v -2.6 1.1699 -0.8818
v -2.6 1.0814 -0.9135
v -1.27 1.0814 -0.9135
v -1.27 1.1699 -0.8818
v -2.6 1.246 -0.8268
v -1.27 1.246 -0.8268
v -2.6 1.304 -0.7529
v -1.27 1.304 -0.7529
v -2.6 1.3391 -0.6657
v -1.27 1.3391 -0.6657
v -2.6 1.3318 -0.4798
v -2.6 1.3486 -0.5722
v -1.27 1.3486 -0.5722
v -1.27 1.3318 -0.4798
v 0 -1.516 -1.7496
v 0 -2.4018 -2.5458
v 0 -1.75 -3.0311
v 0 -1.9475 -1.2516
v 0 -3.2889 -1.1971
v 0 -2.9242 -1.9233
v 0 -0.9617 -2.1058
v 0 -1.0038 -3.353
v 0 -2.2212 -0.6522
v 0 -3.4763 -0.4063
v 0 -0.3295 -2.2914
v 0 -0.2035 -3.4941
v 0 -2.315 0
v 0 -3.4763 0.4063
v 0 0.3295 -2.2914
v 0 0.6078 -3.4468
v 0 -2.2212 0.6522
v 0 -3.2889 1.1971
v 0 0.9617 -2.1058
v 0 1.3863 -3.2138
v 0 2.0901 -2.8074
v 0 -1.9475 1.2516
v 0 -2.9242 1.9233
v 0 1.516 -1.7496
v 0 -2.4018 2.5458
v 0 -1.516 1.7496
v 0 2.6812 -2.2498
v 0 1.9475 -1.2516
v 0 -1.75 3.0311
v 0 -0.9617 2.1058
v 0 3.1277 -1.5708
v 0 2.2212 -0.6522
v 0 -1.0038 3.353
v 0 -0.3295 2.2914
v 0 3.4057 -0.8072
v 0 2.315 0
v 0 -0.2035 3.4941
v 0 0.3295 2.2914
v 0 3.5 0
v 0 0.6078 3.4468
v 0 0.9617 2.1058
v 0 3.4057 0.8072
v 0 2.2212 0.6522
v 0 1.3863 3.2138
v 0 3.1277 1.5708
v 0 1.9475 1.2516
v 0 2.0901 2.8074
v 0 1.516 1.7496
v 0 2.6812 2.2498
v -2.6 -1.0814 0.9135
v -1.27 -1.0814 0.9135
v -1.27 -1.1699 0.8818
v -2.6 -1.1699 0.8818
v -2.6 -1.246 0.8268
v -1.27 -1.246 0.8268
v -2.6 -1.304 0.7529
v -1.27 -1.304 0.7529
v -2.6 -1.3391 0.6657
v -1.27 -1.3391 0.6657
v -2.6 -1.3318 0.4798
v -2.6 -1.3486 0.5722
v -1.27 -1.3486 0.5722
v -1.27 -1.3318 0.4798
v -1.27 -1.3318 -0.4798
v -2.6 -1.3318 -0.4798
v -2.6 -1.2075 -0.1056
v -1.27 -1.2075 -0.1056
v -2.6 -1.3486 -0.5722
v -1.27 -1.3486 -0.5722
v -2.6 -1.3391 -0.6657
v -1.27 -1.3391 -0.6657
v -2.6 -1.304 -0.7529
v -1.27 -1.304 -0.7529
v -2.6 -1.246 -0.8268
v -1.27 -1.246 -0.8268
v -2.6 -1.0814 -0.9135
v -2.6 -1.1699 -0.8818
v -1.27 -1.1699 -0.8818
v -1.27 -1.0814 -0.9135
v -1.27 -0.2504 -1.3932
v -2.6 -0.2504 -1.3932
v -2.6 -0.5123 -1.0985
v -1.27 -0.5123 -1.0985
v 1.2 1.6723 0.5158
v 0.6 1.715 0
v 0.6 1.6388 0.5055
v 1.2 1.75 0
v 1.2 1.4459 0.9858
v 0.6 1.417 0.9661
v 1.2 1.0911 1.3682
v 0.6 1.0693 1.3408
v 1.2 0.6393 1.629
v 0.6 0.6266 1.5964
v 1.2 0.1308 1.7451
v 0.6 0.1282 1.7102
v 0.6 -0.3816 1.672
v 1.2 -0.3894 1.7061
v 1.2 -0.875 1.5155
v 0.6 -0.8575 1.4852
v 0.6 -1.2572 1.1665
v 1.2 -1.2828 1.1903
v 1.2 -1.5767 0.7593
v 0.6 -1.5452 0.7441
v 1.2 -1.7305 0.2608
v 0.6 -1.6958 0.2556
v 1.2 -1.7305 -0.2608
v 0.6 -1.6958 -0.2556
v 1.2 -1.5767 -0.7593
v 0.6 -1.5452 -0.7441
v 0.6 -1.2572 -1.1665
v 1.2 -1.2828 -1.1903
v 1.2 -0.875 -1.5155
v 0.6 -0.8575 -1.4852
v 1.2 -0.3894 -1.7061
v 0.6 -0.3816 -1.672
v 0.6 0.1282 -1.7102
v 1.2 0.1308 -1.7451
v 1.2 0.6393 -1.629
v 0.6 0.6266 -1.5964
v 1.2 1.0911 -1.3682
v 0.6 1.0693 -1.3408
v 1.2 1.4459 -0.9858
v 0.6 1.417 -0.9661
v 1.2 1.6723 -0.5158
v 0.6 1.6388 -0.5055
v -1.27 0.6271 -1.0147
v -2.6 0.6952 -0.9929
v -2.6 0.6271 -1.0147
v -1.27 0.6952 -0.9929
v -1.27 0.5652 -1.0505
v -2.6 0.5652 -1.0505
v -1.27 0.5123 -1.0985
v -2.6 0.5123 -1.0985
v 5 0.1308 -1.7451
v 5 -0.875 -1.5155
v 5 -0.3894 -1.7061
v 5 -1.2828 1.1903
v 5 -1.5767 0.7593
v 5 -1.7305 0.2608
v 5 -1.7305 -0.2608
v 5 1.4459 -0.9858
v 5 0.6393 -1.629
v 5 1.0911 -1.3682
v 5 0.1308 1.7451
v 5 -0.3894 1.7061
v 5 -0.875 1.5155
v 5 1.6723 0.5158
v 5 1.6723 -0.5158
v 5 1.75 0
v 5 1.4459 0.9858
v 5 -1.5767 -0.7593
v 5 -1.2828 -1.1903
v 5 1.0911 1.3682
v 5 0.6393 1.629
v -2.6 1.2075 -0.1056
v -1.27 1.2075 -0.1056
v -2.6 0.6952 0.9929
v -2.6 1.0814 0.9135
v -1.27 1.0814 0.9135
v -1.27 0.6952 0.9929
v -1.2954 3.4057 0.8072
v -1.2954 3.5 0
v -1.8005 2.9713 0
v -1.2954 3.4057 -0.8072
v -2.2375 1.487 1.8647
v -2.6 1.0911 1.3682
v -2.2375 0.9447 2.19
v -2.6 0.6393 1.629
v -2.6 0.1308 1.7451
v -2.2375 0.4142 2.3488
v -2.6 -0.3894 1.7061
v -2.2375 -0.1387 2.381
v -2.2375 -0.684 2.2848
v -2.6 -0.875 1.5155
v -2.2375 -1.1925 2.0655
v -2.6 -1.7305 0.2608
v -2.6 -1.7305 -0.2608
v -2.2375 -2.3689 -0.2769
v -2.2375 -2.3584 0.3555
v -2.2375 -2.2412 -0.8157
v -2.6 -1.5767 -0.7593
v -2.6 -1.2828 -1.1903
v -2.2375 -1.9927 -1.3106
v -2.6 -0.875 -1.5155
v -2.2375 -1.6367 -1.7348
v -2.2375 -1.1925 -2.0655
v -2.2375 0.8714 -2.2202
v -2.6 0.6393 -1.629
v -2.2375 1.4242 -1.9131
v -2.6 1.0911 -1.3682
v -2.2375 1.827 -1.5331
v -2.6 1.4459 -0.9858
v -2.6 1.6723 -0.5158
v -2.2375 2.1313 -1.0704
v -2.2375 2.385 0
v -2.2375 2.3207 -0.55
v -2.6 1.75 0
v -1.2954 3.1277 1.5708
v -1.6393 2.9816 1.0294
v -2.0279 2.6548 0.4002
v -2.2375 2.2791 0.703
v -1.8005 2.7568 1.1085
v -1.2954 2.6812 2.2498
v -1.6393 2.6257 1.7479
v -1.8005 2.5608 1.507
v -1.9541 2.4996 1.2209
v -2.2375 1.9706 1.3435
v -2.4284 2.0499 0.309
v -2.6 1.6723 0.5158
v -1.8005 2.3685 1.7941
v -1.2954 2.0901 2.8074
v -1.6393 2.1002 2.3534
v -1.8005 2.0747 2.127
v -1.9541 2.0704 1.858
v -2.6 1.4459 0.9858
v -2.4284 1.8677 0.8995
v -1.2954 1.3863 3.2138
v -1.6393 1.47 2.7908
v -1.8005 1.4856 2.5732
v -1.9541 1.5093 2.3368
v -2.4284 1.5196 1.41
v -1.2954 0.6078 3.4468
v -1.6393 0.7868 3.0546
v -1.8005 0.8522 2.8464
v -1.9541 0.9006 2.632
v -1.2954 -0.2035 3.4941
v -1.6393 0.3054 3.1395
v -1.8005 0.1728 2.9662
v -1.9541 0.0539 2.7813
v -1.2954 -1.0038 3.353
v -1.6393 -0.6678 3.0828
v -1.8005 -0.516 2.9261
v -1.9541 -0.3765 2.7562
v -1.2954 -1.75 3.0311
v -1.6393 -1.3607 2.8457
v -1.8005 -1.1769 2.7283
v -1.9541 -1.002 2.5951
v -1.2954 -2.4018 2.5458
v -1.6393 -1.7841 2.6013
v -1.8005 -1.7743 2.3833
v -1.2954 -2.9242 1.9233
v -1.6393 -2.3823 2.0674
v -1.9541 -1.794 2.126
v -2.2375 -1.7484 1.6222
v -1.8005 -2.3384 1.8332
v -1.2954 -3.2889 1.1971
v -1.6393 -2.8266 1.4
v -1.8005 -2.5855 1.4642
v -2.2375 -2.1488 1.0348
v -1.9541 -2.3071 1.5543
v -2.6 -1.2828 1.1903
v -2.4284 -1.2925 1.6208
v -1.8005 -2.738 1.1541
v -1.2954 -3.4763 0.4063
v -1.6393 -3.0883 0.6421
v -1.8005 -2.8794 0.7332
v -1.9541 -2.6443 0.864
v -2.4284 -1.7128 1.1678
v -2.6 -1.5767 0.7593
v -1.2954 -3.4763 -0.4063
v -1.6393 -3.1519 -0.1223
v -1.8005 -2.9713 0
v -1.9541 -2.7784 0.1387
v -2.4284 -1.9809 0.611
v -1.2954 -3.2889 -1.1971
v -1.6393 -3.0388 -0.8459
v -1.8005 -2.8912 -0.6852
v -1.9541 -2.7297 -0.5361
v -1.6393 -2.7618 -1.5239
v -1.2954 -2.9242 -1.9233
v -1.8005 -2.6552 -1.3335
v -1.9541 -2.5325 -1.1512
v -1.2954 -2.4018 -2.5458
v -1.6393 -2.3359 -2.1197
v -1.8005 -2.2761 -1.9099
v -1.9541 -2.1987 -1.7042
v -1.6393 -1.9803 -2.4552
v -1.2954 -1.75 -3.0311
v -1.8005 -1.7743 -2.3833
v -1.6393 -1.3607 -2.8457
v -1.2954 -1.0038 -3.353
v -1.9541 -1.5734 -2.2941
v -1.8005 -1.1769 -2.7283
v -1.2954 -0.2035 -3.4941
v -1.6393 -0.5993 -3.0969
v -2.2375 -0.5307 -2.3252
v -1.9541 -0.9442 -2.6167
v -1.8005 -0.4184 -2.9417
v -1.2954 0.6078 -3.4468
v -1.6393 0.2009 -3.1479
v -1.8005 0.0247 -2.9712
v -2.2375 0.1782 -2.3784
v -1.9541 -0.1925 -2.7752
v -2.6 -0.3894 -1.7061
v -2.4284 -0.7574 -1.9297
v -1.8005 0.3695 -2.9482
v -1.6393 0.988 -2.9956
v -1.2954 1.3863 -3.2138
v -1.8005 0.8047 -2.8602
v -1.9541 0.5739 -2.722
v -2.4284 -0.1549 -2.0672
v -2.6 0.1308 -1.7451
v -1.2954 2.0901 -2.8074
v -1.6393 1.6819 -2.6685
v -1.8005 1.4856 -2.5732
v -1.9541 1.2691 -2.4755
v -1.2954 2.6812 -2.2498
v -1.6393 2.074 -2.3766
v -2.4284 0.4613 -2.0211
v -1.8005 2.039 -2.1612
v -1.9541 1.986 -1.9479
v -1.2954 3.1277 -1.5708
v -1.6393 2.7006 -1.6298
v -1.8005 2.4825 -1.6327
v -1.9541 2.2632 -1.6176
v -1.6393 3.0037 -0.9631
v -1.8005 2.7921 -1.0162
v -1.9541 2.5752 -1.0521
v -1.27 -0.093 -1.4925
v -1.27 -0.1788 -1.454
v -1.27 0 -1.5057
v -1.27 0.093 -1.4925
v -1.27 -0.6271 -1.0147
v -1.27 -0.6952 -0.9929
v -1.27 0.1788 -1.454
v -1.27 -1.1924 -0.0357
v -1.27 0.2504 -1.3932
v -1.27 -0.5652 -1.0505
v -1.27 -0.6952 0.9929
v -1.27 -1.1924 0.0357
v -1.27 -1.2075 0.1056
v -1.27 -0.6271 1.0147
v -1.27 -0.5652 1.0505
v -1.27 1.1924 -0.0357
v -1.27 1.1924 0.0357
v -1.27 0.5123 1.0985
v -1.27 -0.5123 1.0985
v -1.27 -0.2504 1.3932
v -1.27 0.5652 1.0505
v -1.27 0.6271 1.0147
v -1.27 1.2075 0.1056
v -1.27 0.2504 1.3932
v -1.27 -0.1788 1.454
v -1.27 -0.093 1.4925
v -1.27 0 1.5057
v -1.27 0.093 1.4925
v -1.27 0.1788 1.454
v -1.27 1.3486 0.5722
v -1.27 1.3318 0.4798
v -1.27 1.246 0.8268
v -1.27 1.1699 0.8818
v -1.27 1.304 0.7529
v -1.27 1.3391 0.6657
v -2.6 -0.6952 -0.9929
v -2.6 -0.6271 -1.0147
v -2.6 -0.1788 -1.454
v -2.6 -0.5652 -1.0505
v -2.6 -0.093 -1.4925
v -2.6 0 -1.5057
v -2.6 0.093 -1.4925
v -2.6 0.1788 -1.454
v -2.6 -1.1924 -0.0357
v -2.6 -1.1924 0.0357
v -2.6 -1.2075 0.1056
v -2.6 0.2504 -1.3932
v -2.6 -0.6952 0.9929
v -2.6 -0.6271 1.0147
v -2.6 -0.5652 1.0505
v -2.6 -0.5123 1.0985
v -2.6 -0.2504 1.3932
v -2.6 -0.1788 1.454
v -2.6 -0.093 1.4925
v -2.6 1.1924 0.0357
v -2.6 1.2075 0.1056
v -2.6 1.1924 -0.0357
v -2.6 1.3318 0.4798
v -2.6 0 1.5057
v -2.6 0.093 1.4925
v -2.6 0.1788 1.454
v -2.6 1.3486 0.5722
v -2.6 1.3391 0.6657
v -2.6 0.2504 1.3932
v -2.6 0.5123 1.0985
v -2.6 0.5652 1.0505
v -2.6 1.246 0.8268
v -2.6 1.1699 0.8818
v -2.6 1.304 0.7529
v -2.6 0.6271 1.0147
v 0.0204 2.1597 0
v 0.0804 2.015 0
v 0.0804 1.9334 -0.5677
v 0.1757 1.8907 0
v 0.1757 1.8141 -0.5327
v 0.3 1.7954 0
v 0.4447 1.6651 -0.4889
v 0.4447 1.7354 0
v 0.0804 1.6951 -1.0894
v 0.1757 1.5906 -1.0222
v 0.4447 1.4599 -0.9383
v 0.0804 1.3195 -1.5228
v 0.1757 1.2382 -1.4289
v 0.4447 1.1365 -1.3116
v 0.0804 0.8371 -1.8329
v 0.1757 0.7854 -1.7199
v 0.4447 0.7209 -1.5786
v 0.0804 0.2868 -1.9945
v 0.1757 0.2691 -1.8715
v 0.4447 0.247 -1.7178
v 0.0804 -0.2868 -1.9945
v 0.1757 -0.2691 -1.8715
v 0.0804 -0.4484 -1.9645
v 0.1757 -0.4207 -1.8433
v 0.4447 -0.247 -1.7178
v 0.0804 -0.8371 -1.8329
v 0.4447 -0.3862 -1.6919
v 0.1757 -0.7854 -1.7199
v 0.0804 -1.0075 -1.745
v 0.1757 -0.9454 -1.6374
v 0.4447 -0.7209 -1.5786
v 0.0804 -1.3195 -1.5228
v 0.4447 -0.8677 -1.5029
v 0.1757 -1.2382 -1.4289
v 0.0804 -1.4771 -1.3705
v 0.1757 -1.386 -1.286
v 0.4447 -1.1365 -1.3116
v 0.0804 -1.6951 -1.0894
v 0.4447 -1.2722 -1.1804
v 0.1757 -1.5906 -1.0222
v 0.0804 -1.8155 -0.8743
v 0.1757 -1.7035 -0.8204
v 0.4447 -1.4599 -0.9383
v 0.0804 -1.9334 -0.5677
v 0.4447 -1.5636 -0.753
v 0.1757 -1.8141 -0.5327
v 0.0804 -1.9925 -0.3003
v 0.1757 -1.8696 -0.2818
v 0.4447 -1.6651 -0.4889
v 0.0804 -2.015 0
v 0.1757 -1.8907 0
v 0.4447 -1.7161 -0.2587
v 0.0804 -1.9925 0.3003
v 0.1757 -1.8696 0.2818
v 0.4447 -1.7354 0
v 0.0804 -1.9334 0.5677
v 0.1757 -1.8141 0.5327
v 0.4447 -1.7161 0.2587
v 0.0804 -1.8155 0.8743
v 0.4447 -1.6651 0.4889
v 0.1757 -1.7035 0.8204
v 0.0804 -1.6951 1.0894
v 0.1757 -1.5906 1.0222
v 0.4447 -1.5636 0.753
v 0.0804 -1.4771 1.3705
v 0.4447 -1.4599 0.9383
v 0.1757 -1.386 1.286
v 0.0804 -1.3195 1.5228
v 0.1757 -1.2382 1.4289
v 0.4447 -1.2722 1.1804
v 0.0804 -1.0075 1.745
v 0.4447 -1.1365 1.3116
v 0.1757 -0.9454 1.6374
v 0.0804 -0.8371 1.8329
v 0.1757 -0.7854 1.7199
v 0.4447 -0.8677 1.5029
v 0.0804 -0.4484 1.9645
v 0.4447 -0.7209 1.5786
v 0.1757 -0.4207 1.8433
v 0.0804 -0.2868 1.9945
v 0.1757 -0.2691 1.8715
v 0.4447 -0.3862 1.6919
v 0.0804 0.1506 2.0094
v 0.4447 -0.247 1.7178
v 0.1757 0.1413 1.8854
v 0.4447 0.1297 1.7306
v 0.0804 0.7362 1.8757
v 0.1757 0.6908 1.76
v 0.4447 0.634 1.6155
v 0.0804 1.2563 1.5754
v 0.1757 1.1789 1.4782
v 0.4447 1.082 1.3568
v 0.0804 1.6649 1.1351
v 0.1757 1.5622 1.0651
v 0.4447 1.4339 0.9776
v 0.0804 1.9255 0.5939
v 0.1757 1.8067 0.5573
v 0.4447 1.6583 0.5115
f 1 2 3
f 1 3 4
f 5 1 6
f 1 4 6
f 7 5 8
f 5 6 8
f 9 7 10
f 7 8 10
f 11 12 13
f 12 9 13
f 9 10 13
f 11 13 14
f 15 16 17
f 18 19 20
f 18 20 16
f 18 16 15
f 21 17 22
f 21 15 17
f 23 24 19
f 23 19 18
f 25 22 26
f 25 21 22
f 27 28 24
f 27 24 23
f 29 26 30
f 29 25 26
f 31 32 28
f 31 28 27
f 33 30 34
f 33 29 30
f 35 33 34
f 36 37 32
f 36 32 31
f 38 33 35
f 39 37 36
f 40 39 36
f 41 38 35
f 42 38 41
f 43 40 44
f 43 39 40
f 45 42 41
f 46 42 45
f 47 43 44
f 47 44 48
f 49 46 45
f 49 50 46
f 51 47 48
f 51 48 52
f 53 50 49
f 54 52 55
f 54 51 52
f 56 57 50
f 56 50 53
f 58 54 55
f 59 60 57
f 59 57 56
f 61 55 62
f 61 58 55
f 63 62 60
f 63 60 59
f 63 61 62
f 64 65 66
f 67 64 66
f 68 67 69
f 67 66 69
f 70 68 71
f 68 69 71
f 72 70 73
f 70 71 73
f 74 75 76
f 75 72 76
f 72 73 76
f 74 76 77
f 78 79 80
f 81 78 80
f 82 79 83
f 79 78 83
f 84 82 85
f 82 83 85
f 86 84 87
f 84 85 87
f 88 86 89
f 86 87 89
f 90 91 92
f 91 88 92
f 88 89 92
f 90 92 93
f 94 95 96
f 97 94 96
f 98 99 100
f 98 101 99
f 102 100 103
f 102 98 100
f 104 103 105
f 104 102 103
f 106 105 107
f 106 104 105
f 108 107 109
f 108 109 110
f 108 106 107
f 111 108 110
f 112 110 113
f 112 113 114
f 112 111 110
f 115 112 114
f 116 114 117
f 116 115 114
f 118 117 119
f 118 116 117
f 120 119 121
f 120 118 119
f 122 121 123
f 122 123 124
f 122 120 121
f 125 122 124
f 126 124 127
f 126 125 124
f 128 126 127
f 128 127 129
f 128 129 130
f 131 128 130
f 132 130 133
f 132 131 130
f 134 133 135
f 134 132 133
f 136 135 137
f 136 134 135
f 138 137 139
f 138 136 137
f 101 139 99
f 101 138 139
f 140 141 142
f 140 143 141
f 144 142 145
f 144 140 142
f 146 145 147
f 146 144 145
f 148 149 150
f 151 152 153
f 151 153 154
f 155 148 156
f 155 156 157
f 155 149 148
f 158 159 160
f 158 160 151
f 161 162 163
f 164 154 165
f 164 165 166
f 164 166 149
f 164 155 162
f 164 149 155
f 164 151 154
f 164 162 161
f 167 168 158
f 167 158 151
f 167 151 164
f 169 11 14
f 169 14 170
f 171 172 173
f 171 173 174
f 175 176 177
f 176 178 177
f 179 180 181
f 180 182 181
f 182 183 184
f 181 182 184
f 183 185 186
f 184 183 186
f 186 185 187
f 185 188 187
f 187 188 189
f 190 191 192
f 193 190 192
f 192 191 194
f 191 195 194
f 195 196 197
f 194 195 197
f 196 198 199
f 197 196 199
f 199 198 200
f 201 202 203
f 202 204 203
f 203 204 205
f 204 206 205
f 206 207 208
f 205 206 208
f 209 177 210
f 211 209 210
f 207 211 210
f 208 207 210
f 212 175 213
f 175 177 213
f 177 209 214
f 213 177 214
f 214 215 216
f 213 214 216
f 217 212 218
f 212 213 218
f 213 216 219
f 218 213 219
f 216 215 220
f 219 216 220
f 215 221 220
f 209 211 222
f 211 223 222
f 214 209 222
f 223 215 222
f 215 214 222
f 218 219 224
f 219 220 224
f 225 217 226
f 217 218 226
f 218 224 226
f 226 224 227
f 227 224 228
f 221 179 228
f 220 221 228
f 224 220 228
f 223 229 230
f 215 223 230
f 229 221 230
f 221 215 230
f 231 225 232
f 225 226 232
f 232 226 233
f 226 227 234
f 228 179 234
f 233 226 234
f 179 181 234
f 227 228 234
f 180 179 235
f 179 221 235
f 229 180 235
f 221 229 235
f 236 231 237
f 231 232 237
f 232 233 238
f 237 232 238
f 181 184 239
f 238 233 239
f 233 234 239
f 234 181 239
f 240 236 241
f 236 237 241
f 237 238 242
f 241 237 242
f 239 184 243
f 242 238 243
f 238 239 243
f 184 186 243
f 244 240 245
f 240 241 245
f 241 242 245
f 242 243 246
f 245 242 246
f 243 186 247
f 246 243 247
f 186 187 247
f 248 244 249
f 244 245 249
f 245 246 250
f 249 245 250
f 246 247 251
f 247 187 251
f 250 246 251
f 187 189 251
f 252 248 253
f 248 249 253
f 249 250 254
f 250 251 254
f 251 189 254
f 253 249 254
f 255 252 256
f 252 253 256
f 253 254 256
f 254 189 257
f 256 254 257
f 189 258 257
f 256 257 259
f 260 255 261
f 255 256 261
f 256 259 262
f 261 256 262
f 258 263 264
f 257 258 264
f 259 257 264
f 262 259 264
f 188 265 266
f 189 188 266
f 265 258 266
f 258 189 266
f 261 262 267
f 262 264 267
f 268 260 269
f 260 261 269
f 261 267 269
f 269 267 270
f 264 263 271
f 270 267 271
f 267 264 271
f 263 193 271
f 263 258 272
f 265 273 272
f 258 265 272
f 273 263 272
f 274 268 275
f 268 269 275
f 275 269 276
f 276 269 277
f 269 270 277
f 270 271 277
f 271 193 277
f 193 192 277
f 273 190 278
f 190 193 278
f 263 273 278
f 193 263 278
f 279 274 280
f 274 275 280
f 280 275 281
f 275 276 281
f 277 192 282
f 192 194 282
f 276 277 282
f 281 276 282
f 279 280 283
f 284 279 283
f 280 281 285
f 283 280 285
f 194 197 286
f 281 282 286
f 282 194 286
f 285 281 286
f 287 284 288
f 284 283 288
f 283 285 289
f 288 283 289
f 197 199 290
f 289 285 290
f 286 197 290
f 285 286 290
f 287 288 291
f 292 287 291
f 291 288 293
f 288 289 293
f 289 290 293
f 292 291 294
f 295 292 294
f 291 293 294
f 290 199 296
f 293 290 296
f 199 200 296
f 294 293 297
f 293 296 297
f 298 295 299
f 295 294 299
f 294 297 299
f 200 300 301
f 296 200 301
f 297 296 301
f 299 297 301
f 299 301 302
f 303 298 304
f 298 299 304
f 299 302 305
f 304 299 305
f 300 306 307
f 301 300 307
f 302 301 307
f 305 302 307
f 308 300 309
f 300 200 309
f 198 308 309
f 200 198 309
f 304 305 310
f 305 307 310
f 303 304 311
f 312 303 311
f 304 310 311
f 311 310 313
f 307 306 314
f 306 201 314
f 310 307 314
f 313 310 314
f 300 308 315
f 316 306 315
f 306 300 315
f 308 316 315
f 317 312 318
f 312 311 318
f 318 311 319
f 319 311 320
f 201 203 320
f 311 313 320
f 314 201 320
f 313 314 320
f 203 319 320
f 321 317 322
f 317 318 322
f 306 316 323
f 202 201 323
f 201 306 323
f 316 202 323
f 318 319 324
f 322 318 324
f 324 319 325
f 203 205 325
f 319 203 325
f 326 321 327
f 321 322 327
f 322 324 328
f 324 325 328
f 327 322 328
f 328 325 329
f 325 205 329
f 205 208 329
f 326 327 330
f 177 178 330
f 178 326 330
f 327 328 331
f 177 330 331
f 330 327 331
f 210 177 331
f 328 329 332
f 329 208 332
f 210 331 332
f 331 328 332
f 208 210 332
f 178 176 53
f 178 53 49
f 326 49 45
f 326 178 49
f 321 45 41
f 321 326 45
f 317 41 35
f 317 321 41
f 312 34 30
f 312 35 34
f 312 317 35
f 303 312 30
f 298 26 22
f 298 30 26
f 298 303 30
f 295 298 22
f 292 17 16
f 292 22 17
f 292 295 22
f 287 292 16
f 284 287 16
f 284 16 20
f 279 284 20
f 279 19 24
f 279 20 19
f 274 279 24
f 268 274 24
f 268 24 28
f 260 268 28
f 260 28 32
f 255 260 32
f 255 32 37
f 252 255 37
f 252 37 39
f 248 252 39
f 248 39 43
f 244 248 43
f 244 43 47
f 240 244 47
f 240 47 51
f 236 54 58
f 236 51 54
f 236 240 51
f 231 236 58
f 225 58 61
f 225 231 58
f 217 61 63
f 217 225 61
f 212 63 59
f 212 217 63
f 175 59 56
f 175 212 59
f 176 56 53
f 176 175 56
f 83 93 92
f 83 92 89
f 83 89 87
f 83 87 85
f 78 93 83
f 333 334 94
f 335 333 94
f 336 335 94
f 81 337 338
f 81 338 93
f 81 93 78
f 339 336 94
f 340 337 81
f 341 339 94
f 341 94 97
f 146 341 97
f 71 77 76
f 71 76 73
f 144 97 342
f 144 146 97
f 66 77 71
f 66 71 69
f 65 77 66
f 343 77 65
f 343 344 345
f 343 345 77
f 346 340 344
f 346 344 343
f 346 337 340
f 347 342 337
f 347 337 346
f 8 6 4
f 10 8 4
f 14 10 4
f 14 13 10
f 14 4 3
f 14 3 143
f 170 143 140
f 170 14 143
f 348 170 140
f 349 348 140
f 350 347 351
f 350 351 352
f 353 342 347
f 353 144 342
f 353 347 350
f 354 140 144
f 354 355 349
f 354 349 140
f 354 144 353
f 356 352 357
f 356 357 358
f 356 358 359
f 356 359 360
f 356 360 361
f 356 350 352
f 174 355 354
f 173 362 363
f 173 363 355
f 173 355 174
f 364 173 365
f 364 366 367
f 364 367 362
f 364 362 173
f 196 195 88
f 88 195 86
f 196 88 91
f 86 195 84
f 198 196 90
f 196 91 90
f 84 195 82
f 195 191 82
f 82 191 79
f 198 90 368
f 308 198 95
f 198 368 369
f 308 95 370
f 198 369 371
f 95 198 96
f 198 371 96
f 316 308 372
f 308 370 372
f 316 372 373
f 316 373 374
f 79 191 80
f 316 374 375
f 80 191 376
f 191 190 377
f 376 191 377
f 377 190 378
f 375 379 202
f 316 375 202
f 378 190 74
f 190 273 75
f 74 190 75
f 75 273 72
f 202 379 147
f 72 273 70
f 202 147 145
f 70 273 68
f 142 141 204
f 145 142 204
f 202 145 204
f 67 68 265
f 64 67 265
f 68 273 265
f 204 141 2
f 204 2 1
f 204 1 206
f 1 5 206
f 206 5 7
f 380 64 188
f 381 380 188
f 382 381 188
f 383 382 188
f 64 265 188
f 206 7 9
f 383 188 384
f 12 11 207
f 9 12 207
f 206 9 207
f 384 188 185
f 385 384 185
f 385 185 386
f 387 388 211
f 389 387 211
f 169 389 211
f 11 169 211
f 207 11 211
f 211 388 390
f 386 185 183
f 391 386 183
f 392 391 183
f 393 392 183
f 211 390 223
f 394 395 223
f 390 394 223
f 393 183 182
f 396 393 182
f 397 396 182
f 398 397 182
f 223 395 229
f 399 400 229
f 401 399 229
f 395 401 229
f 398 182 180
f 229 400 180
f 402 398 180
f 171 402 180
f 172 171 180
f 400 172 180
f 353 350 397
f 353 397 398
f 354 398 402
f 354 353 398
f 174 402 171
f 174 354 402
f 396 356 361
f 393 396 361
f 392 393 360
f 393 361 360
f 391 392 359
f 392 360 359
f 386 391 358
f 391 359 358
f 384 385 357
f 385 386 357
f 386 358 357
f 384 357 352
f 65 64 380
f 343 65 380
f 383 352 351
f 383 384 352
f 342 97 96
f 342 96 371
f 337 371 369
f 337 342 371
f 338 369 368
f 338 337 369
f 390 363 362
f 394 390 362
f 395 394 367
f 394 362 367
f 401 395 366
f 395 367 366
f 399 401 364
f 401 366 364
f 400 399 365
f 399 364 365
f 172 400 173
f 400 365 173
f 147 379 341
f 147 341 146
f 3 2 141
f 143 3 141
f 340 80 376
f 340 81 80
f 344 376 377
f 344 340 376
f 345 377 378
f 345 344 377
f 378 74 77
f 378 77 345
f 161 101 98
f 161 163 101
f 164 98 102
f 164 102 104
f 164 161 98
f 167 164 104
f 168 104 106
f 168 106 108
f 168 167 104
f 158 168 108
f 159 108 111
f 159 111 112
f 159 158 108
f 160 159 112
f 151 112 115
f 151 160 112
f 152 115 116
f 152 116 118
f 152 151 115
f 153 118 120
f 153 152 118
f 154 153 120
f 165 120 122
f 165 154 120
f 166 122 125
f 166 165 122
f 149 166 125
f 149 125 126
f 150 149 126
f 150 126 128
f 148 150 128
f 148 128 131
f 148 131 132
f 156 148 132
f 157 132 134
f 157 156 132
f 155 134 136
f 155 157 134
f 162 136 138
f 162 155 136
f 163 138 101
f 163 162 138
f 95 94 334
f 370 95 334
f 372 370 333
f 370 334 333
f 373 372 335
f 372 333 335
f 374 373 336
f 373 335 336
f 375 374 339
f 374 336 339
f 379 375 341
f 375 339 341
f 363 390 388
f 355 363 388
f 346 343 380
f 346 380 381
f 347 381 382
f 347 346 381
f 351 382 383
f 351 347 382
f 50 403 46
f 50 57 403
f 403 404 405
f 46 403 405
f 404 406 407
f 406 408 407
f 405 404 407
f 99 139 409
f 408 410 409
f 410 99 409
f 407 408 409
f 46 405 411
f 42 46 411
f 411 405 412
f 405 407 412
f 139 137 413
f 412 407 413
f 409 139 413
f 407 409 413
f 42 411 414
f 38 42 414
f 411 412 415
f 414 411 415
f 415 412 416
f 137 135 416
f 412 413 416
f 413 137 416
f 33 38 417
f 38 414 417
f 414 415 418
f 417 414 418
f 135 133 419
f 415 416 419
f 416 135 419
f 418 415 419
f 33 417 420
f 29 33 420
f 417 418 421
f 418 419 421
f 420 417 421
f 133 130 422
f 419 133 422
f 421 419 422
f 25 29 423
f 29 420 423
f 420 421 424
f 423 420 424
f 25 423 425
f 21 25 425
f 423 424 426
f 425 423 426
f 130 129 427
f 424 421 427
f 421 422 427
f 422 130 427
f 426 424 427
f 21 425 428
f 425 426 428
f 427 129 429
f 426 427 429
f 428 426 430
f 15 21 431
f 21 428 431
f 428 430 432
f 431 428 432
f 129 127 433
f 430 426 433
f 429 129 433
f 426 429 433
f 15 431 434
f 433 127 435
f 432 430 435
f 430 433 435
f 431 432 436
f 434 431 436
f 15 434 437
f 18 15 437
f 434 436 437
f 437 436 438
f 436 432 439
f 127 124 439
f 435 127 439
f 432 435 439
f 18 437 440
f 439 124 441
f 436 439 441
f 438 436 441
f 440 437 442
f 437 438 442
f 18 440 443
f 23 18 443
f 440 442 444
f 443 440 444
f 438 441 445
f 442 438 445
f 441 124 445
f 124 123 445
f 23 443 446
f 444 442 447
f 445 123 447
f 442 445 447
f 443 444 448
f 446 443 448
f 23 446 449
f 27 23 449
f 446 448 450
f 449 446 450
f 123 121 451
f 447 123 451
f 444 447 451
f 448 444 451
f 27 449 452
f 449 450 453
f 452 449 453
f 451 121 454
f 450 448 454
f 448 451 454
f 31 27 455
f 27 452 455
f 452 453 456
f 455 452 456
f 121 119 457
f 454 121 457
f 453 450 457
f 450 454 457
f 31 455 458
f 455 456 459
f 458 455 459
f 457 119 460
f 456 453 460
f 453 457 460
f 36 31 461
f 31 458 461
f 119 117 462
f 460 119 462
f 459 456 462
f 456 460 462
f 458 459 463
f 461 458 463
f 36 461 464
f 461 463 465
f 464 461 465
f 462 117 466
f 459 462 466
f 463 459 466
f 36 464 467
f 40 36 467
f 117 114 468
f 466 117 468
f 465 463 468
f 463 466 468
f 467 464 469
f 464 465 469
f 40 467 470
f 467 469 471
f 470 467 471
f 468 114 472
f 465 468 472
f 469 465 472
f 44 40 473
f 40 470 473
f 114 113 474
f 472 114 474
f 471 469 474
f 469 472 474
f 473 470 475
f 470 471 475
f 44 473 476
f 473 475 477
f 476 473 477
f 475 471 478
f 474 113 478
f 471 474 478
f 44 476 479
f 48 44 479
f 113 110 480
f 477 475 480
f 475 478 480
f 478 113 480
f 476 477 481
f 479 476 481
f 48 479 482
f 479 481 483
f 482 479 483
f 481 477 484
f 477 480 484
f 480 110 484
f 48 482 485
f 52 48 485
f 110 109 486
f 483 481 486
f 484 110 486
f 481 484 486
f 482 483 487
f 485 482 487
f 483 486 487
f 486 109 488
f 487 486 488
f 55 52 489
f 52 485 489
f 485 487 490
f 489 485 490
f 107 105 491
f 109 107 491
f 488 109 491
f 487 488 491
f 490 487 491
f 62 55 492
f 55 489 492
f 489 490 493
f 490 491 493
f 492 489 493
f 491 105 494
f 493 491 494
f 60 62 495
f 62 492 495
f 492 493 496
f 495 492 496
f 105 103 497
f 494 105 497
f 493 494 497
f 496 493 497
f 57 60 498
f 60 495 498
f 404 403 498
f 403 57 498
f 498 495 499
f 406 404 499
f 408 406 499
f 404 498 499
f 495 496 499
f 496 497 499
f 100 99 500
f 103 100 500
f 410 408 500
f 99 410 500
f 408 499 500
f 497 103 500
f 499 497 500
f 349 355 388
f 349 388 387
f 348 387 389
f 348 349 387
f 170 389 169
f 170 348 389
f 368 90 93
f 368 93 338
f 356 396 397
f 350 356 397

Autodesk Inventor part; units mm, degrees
ref_plane "YZ Plane" through (0, 0, 0) normal (1, 0, 0) x (0, 1, 0)
ref_plane "XZ Plane" through (0, 0, 0) normal (0, 1, 0) x (-1, 0, 0)
ref_plane "XY Plane" through (0, 0, 0) normal (0, 0, 1) x (1, 0, 0)
sketch "Sketch4" plane through (0, 0, 0) normal (0, 0, 1) x (1, 0, 0)
  line L0 (-2.6, 0) -> (5, 0)
  line L1 (0, 0) -> (-2.6, 0)
  line L2 (0, 3.5) -> (0, 2.315)
  line L3 (0.6, 1.715) -> (0.6, 1.715)
  line L4 (0.6, 1.715) -> (1.2, 1.75)
  arc A0 (0, 2.315) -> (0.6, 1.715) centre (0.6, 2.315) ccw
  line L5 (-2.6, 0) -> (-2.6, 1.75)
  line L6 (0, 3.5) -> (-1.2954, 3.5)
  arc A1 (-1.2954, 3.5) -> (-2.6, 1.75) centre (2.7825, -0.9012) ccw
  line L7 (1.2, 1.75) -> (5, 1.75)
  line L8 (5, 1.75) -> (5, 0)
  point P0 (0, 1.715)
  dimension "d71" = 0.6
  dimension "d72" = 5
  dimension "d74" = 0.6
  dimension "d75" = 3.43
  dimension "d78" = 3.5
  dimension "d82" = 6
  dimension "d83" = 2.6
  dimension "d84" = 7
  dimension "d104" = 3.8
  dimension "d105" = 3.5
revolve "Revolution7" add sketch "Sketch4" angle 360 about axis through (-2.6, 0, 0) along (1, 0, 0)
sketch "Sketch5" plane through (-2.6, 0, 0) normal (-1, 0, 0) x (0, 0, 1)
  circle A0 centre (0, 0) radius 1.675 construction
  circle A1 centre (0, 0) radius 1.1725 construction
  line L0 (0, 0) -> (-1.0154, 0.5862)
  line L1 (0, 0) -> (-1.0154, -0.5862)
  line L2 (-1.8008, 0) -> (1.7887, 0)
  line L3 (-1.675, 0) -> (-1.0154, -0.5862)
  line L4 (-1.675, 0) -> (-1.0154, 0.5862)
  point P0 (0, 0)
  dimension "d88" = 3.35
  dimension "d89" = 2.345
  dimension "d90" = 30
  dimension "d91" = 30
extrude "Extrusion1" cut sketch "Sketch5" against normal blind 1.33
pattern_circular "Circular Pattern1" count 6 over 360 about axis through (-10, 0, 0) along (1, 0, 0) of "Extrusion1"
fillet "Fillet1" radius 0.335 12 edges at (-1.935, -1.4506, -0.8375) (-1.935, -0.5862, -1.0154) (-1.935, -1.1725, 0) (-1.935, -1.4506, 0.8375) (-1.935, -0.5862, 1.0154) (-1.935, 0, 1.675) (-1.935, 1.1725, 0) (-1.935, 1.4506, 0.8375) (-1.935, 0.5863, 1.0154) (-1.935, 0.5862, -1.0154) (-1.935, 0, -1.675) (-1.935, 1.4506, -0.8375)
thread "Thread7" size "M3.5x0.6" class "6g" standard "ISO Metric profile" length 3.8
equation "\"a\" = 1.2"
equation "\"b\" = 3.8"
equation "\"dk\" = 7"
equation "\"k\" = 2.6"
equation "\"r\" = 0.6"
equation "\"rf\" = 6"
equation "\"x\" = 0.6"
equation "\"A_\" = 3.35"
equation "\"t\" = 1.33"
equation "\"p\" = 0.6"
equation "\"l_\" = 5"
equation "\"d\" = 3.5"
equation "\"ds_\" = 3.43"
equation "\"lg\" = 0"
properties part number "Винты со звездообразным углублением в плоско-выпуклой головке ISO 14583 — M3,5 x 5 — 4.8" material "Сталь"
